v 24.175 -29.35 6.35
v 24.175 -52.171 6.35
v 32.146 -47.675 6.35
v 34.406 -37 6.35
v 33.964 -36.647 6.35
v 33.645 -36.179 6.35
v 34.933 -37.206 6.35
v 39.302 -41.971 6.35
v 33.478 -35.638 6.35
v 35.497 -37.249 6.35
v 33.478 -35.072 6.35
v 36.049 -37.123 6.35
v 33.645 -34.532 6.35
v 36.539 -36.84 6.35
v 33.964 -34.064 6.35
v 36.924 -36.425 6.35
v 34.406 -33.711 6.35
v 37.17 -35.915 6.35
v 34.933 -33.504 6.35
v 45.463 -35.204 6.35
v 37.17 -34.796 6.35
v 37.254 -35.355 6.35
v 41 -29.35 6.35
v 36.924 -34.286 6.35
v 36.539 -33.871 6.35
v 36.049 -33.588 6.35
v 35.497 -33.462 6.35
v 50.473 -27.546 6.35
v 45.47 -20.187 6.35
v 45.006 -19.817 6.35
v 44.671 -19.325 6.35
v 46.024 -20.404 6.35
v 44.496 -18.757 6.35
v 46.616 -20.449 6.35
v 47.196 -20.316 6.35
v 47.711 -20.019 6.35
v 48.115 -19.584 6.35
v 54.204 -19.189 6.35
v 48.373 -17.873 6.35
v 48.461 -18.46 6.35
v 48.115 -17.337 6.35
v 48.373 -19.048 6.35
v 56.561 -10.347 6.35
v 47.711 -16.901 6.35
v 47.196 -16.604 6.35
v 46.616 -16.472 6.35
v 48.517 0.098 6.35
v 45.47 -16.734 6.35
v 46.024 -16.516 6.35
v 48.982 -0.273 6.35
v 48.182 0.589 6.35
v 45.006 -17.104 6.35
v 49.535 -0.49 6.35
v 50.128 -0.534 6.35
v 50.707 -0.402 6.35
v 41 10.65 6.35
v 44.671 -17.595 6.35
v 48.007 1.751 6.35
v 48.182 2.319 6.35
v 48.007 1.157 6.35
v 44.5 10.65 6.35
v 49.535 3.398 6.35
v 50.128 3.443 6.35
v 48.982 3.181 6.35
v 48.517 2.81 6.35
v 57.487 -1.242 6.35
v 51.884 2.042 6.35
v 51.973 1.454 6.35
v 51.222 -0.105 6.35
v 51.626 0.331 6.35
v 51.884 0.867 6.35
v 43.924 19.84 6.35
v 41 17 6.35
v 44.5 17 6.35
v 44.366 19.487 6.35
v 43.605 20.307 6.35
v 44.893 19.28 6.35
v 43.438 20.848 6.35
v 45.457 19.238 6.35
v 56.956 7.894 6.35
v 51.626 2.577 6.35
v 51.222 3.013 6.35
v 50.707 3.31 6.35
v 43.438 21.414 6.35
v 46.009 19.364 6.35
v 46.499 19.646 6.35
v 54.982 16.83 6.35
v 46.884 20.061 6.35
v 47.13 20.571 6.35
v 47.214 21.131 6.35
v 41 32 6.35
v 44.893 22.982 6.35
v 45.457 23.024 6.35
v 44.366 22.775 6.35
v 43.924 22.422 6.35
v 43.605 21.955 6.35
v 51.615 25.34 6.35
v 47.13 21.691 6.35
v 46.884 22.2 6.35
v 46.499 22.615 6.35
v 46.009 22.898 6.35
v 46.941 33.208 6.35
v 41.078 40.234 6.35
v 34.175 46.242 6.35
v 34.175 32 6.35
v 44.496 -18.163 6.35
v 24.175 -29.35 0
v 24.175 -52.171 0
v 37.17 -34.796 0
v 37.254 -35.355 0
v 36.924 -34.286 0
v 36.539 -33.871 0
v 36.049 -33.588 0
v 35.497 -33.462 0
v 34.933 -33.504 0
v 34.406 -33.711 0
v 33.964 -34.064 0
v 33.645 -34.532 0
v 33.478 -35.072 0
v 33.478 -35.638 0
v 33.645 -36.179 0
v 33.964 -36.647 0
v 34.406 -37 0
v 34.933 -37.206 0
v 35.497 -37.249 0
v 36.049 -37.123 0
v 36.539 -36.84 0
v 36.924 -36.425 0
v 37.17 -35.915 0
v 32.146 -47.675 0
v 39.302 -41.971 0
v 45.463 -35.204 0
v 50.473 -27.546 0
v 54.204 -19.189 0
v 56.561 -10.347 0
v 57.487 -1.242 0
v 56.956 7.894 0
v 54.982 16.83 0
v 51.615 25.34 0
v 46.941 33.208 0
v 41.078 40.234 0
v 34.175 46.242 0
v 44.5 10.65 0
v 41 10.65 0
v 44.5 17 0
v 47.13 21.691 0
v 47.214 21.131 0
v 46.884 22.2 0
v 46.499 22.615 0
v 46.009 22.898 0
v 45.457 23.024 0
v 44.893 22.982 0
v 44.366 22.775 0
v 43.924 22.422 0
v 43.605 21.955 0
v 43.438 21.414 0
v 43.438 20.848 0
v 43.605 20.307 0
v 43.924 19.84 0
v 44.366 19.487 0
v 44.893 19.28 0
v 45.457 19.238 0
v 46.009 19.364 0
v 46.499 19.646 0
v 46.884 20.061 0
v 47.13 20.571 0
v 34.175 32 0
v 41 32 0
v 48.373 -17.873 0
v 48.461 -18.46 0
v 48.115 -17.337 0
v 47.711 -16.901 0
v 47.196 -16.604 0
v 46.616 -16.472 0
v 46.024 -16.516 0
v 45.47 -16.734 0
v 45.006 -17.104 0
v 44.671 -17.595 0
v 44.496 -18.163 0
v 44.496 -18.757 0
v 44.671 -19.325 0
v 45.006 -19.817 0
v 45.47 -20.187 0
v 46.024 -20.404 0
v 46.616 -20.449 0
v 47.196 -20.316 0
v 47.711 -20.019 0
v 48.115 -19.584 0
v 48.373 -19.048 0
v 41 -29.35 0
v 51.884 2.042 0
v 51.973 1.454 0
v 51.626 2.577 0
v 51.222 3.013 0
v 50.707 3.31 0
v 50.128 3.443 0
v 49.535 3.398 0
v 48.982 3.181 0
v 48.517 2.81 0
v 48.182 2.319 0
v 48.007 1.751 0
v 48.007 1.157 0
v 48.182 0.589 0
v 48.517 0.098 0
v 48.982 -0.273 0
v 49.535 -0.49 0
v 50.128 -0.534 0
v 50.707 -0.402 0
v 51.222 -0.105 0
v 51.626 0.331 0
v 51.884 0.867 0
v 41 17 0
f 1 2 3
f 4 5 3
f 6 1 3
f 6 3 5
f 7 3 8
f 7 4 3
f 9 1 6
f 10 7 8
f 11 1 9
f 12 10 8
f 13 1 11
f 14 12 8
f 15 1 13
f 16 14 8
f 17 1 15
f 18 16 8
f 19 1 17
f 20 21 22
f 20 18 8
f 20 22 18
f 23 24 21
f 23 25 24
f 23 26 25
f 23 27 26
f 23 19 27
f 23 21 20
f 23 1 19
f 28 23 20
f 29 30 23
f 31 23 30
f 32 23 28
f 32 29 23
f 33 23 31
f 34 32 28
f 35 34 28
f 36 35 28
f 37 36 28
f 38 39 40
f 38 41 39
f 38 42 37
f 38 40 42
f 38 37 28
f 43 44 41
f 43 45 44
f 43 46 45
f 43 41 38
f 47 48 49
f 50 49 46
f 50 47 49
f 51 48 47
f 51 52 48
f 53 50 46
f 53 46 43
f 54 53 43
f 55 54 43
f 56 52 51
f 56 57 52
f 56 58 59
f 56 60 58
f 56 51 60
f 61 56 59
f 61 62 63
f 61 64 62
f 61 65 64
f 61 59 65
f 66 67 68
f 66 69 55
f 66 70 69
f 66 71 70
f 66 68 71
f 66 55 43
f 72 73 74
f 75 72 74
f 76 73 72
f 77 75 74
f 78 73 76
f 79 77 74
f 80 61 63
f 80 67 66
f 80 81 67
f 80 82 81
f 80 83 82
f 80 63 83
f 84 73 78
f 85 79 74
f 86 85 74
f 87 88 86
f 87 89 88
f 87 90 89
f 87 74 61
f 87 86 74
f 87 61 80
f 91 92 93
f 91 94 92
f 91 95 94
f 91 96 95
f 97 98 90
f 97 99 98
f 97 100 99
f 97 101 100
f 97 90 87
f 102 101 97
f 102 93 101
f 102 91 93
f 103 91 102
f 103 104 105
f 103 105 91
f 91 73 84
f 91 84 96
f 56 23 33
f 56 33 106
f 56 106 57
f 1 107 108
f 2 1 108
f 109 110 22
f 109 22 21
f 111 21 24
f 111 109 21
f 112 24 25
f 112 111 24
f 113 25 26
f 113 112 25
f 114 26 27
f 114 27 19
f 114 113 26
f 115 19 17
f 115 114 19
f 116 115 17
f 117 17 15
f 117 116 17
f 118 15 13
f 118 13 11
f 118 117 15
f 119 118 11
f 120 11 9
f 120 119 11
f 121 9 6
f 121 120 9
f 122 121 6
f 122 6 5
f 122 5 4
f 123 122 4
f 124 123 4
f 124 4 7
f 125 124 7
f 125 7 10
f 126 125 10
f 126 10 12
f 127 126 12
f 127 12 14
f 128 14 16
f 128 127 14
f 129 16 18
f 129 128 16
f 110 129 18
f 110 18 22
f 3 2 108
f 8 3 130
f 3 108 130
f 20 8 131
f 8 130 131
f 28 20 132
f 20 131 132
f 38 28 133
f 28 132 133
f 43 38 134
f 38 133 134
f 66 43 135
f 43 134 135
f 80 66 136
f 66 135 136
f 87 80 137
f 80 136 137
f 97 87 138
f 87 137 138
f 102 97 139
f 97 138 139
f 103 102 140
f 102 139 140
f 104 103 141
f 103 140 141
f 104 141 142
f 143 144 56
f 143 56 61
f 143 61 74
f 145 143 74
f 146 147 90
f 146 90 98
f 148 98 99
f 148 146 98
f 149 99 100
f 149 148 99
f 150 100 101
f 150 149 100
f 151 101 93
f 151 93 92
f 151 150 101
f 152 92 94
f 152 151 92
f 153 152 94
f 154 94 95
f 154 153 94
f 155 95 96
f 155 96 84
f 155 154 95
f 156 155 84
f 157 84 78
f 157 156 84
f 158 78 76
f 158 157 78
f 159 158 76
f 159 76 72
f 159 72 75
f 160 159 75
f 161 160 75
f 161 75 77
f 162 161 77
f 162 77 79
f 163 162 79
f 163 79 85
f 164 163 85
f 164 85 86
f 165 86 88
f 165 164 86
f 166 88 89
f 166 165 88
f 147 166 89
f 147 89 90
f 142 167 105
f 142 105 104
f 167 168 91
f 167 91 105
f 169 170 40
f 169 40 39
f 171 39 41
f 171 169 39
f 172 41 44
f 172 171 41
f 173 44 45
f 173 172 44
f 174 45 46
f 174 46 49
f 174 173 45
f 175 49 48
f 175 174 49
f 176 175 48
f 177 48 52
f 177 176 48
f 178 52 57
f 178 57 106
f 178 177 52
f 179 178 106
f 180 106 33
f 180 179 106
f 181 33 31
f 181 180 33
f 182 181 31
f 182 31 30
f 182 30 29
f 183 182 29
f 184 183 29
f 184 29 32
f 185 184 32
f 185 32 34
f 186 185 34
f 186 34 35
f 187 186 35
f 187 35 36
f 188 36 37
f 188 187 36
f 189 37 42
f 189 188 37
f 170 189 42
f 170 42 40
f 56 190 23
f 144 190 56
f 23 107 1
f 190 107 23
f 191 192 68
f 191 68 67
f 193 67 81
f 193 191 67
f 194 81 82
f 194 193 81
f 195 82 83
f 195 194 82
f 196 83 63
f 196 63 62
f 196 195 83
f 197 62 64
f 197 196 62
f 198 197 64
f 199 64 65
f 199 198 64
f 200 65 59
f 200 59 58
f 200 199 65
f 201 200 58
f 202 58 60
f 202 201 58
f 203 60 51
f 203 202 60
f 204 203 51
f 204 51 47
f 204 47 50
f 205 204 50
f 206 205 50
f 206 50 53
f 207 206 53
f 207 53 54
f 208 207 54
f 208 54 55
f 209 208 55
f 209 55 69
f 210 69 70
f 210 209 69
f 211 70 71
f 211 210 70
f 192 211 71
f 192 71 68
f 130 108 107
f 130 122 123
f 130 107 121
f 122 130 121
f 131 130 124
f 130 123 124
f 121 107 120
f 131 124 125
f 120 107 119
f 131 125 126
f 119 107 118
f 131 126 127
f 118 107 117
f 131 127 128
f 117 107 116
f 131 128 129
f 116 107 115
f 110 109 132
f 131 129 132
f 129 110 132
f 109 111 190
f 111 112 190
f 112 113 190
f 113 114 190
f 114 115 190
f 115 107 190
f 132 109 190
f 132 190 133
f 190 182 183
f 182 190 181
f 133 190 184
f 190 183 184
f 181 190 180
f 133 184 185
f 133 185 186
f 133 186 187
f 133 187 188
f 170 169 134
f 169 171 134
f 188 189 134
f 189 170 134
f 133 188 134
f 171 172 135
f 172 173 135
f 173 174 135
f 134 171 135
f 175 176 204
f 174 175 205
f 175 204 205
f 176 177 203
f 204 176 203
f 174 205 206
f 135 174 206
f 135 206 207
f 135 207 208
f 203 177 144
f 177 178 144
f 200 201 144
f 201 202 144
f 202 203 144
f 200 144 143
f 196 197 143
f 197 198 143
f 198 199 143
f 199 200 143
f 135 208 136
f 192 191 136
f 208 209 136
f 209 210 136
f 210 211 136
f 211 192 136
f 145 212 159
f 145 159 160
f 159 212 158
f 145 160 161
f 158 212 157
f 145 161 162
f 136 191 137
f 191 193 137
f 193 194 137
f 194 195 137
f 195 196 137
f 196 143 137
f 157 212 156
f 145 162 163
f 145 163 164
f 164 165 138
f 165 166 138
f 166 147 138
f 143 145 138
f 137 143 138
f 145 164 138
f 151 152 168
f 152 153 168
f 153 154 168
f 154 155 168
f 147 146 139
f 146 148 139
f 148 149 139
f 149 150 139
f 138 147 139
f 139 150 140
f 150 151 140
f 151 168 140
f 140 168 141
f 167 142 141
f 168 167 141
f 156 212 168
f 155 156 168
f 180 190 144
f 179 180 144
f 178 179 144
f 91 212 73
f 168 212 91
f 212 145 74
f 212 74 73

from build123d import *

# Parameters (mm, degrees)
SKETCH1_R           = 57.5
SKETCH1_R_2         = 1.89865
SKETCH1_R_3         = 1.9939
SKETCH1_R_4         = 8
BOSS_EXTRUDE1_DEPTH = 6.35
CUT_EXTRUDE1_DEPTH  = 82.564836173
SKETCH3_W           = 6.35
SKETCH3_H           = 80
CUT_EXTRUDE3_DEPTH  = 82.564836173
CUT_EXTRUDE5_DEPTH  = 82.564836173
CUT_EXTRUDE6_DEPTH  = 78.899883665


with BuildPart() as part:
    # Sketch1 → Boss-Extrude1 (new body)
    with BuildSketch(Plane.XY):
        Circle(SKETCH1_R)
        with Locations((45.315389352, 21.130913087)):
            Circle(SKETCH1_R_2, mode=Mode.SUBTRACT)
        with Locations((49.978847504, 1.454235937)):
            Circle(SKETCH1_R_3, mode=Mode.SUBTRACT)
        Circle(SKETCH1_R_4, mode=Mode.SUBTRACT)
        with Locations((46.467376211, -18.460307366)):
            Circle(SKETCH1_R_3, mode=Mode.SUBTRACT)
        with Locations((0, -16.5)):
            Circle(SKETCH1_R_3, mode=Mode.SUBTRACT)
        with Locations((0, -50)):
            Circle(SKETCH1_R_2, mode=Mode.SUBTRACT)
        with Locations((-16.5, 0)):
            Circle(SKETCH1_R_3, mode=Mode.SUBTRACT)
        with Locations((-11.66726189, -11.66726189)):
            Circle(SKETCH1_R_2, mode=Mode.SUBTRACT)
        with Locations((0, 16.5)):
            Circle(SKETCH1_R_3, mode=Mode.SUBTRACT)
        with Locations((-11.66726189, 11.66726189)):
            Circle(SKETCH1_R_2, mode=Mode.SUBTRACT)
        with Locations((11.66726189, 11.66726189)):
            Circle(SKETCH1_R_2, mode=Mode.SUBTRACT)
        with Locations((-35.355339059, -35.355339059)):
            Circle(SKETCH1_R_2, mode=Mode.SUBTRACT)
        with Locations((-50, 0)):
            Circle(SKETCH1_R_2, mode=Mode.SUBTRACT)
        with Locations((-35.355339059, 35.355339059)):
            Circle(SKETCH1_R_2, mode=Mode.SUBTRACT)
        with Locations((0, 50)):
            Circle(SKETCH1_R_2, mode=Mode.SUBTRACT)
        with Locations((35.355339059, -35.355339059)):
            Circle(SKETCH1_R_2, mode=Mode.SUBTRACT)
    extrude(amount=BOSS_EXTRUDE1_DEPTH)

    # Sketch2 → Cut-Extrude1 (cut, through all)
    with BuildSketch(Plane.XY):
        Polygon((12.5, -29.35), (41, -29.35), (41, 10.65), (44.5, 10.65), (44.5, 17), (41, 17), (41, 32), (21, 32), (21, 17), (17.5, 17), (17.5, 10.65), (21, 10.65), (21, 5.65), (12.5, 5.65), align=None)
    extrude(amount=CUT_EXTRUDE1_DEPTH, mode=Mode.SUBTRACT)

    # Sketch3 → Cut-Extrude3 (cut, through all)
    with BuildSketch(Plane(origin=(0, 0, 0), x_dir=(-1, 0, 0), z_dir=(0, 0, -1))):
        with Locations((-31, 32)):
            Rectangle(SKETCH3_W, SKETCH3_H)
    extrude(amount=-CUT_EXTRUDE3_DEPTH, mode=Mode.SUBTRACT)

    # Sketch4 → Cut-Extrude5 (cut, through all)
    with BuildSketch(Plane.XY):
        with BuildLine():
            Line((21, -36.500002949), (21, -5.372089924))
            Line((21, -5.372089924), (24.175, -5.411516926))
            Line((24.175, -5.411516926), (24.175, -57.5))
            Line((24.175, -57.5), (2.949e-06, -57.5))
            ThreePointArc((2.949e-06, -57.5), (14.849243269, -51.349243269), (21, -36.500002949))
        make_face()
        with BuildLine():
            Line((2.949e-06, 57.5), (24.175, 57.5))
            Line((24.175, 57.5), (24.175, 5.411516926))
            Line((24.175, 5.411516926), (21, 5.372089924))
            Line((21, 5.372089924), (21, 36.500002949))
            ThreePointArc((21, 36.500002949), (14.849243269, 51.349243269), (2.949e-06, 57.5))
        make_face()
    extrude(amount=CUT_EXTRUDE5_DEPTH, mode=Mode.SUBTRACT)


with BuildPart() as cut_extrude5_piece_1:
    # of the separate pieces the step leaves, piece 1, a body of its own (cut_extrude5_pieces_kept)
    add(part.part.solids().sort_by_distance((24.175, -52.171058787, 0))[0])


with BuildPart() as cut_extrude5_piece_2:
    # of the separate pieces the step leaves, piece 2, a body of its own (cut_extrude5_pieces_kept)
    add(part.part.solids().sort_by_distance((24.175, 52.171058787, 6.35))[0])

    # Sketch5 → Cut-Extrude6 (cut, through all)
    with BuildSketch(Plane.XY.offset(6.35)):
        with BuildLine():
            Line((24.175, 52.171058787), (24.175, 32))
            Line((24.175, 32), (27.825, 32))
            Line((27.825, 32), (27.825, 50.319175023))
            ThreePointArc((27.825, 50.319175023), (26.016482629, 51.277603607), (24.175, 52.171058787))
        make_face()
    extrude(amount=-CUT_EXTRUDE6_DEPTH, mode=Mode.SUBTRACT)


solid = cut_extrude5_piece_1.part
